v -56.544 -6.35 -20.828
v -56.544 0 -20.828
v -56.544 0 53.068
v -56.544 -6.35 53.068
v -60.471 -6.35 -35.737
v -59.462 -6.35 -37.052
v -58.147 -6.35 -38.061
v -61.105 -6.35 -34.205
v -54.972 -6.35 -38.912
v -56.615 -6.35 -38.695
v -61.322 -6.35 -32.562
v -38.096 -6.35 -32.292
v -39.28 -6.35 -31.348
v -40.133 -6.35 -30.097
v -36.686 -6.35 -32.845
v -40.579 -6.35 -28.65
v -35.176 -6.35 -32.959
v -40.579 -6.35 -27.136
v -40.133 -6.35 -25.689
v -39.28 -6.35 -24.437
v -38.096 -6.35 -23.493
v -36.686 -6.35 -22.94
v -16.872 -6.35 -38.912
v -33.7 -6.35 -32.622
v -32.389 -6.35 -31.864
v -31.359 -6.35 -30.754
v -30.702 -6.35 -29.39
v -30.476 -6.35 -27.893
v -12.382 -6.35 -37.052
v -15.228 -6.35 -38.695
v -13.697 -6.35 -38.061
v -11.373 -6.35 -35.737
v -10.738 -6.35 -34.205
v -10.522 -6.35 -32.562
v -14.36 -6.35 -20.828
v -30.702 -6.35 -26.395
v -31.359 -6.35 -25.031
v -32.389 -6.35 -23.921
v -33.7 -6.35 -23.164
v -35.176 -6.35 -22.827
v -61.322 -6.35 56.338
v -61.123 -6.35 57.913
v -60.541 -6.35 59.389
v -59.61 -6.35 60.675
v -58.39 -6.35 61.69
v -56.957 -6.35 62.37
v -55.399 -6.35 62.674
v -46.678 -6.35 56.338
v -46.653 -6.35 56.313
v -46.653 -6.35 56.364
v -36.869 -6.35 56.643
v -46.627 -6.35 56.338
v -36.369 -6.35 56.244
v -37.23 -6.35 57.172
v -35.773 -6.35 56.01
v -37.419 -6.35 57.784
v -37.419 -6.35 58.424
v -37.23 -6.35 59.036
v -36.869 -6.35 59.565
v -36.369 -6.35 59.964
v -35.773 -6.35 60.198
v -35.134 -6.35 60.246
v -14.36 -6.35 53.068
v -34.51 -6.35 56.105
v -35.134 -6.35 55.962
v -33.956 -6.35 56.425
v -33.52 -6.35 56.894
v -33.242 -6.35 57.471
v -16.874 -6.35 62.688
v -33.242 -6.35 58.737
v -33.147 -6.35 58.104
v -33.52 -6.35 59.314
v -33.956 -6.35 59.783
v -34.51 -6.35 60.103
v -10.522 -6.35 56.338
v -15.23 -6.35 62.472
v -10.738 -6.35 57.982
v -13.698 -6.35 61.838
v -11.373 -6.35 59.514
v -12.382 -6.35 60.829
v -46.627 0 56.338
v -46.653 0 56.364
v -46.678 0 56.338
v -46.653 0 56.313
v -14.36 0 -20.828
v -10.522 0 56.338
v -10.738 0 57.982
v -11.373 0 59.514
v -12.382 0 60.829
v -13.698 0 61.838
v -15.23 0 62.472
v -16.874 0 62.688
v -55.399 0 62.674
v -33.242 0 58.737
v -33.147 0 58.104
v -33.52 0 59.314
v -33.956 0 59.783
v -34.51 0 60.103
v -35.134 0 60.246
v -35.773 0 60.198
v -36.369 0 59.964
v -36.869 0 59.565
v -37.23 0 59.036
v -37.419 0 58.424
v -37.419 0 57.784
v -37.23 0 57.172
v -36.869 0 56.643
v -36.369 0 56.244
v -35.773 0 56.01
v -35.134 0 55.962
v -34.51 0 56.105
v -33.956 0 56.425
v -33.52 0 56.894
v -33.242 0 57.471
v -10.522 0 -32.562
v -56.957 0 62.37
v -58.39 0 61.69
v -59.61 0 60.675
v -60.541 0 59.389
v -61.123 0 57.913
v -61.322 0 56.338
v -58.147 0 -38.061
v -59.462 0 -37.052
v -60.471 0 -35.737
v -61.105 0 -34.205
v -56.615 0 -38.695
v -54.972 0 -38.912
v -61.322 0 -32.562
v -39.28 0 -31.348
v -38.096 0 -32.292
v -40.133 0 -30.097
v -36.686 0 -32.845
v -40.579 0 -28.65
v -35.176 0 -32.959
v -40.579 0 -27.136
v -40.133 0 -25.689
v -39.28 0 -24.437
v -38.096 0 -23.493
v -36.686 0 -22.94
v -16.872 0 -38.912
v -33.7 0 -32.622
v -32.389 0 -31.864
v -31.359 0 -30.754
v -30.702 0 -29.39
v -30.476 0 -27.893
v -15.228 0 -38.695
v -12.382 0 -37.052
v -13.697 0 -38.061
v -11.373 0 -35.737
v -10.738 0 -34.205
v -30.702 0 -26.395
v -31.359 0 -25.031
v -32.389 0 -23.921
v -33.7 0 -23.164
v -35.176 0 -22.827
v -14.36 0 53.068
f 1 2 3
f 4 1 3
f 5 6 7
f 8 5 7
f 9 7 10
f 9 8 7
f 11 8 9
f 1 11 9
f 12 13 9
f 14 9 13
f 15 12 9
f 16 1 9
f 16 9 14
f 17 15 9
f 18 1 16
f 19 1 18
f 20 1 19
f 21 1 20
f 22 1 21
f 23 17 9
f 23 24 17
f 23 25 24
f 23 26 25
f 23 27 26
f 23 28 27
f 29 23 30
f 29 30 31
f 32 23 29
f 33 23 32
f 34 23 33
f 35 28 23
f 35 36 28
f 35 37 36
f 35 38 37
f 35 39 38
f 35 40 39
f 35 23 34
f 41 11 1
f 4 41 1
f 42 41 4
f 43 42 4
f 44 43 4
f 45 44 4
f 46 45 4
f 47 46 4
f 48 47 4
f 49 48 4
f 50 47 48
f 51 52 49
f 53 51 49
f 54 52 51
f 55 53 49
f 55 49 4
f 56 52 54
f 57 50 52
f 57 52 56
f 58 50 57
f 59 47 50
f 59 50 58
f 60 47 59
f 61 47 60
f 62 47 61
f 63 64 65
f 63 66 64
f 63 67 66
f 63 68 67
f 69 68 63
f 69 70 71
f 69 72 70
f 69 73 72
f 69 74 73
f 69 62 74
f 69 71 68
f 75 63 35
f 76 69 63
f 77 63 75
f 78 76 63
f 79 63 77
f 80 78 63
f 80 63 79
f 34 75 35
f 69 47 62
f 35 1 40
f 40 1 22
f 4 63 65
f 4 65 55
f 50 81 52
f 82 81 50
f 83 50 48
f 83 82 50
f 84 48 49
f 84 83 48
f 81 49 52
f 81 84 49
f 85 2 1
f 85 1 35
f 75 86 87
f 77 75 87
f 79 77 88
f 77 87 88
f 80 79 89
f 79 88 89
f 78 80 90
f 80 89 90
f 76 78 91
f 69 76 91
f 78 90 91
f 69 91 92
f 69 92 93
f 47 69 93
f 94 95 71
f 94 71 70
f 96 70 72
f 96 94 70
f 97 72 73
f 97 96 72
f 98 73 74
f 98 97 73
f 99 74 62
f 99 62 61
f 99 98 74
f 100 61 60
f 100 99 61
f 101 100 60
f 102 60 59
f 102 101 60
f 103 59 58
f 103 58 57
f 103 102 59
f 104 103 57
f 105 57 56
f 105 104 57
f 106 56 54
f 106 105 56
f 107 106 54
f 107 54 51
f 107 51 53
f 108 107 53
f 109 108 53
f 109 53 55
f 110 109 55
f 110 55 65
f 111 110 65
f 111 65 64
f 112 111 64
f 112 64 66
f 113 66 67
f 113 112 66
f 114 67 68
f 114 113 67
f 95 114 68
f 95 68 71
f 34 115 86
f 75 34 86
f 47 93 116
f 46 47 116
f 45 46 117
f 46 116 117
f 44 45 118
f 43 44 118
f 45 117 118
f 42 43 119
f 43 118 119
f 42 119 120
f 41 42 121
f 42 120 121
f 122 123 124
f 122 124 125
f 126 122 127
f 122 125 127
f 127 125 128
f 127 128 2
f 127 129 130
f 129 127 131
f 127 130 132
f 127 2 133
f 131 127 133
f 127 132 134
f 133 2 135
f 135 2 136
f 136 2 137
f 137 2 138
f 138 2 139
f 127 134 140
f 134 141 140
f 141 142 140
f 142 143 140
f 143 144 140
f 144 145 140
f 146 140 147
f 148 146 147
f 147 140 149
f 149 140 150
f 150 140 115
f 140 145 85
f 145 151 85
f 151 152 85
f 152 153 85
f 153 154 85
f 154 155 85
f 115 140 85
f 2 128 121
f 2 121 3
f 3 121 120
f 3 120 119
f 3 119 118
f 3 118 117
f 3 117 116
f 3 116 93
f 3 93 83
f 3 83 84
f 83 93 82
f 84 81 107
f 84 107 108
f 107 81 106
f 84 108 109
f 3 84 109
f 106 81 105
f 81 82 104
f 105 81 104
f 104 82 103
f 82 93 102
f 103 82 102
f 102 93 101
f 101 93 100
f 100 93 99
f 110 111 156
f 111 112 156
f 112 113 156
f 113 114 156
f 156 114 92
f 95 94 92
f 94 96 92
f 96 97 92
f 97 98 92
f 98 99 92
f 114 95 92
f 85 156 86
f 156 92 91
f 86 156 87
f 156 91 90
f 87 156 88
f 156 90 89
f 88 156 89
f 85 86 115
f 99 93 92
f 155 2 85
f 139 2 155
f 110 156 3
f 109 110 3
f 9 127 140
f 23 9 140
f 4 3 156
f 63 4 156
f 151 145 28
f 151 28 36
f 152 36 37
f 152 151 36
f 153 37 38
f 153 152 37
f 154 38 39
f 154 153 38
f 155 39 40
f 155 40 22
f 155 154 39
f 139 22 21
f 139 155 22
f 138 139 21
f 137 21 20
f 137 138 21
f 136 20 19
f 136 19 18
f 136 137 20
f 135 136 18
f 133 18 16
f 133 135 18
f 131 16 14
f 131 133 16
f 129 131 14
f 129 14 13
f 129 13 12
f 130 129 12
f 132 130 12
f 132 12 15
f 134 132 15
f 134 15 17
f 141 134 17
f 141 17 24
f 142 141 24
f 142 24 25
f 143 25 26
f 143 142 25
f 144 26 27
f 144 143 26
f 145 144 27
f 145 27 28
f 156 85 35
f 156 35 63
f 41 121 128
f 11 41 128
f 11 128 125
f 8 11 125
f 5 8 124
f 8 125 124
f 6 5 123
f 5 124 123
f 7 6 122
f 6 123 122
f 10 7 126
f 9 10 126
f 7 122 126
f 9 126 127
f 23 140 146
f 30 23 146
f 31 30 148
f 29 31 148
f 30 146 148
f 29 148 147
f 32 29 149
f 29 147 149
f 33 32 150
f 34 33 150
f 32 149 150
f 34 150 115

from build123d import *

# Parameters (mm, degrees)
F0_R     = 5.08
F0_R_2   = 0.0254
F0_W     = 42.184448801
F0_H     = 73.8955140114
F0_R_3   = 2.1477431595
F1_DEPTH = 6.35


# Not quite as in the source:
# - ends of sketch curves that miss each other by under 0.0002 mm in the source are joined


with BuildPart() as f1:
    # F0 (on Front) → F1 (new body)
    with BuildSketch(Plane.XZ):
        with BuildLine():
            ThreePointArc((-55.3989668916, 62.6738528225), (-59.6104772855, 60.6747009039), (-61.3217708439, 56.3382389188))
            Line((-61.3217708439, 56.3382389188), (-61.3217708439, -32.5617610812))
            ThreePointArc((-61.3217708439, -32.5617610812), (-59.4618989044, -37.0518891418), (-54.9717708439, -38.9117610812))
            Line((-54.9717708439, -38.9117610812), (-16.8717708439, -38.9117610812))
            ThreePointArc((-16.8717708439, -38.9117610812), (-12.3816427833, -37.0518891418), (-10.5217708439, -32.5617610812))
            Line((-10.5217708439, -32.5617610812), (-10.5217708439, 56.3382389188))
            ThreePointArc((-10.5217708439, 56.3382389188), (-12.3824811709, 60.8292052103), (-16.8741419405, 62.6882384761))
            Line((-16.8741419405, 62.6882384761), (-55.3989668916, 62.6738528225))
        make_face()
        with Locations((-35.5558670086, -27.8927588342)):
            Circle(F0_R, mode=Mode.SUBTRACT)
        with Locations((-46.6527380049, 56.3382389188)):
            Circle(F0_R_2, mode=Mode.SUBTRACT)
        with Locations((-35.4520422406, 16.1202251911)):
            Rectangle(F0_W, F0_H, mode=Mode.SUBTRACT)
        with Locations((-35.2948196232, 58.1041015685)):
            Circle(F0_R_3, mode=Mode.SUBTRACT)
    extrude(amount=F1_DEPTH)


solid = f1.part
